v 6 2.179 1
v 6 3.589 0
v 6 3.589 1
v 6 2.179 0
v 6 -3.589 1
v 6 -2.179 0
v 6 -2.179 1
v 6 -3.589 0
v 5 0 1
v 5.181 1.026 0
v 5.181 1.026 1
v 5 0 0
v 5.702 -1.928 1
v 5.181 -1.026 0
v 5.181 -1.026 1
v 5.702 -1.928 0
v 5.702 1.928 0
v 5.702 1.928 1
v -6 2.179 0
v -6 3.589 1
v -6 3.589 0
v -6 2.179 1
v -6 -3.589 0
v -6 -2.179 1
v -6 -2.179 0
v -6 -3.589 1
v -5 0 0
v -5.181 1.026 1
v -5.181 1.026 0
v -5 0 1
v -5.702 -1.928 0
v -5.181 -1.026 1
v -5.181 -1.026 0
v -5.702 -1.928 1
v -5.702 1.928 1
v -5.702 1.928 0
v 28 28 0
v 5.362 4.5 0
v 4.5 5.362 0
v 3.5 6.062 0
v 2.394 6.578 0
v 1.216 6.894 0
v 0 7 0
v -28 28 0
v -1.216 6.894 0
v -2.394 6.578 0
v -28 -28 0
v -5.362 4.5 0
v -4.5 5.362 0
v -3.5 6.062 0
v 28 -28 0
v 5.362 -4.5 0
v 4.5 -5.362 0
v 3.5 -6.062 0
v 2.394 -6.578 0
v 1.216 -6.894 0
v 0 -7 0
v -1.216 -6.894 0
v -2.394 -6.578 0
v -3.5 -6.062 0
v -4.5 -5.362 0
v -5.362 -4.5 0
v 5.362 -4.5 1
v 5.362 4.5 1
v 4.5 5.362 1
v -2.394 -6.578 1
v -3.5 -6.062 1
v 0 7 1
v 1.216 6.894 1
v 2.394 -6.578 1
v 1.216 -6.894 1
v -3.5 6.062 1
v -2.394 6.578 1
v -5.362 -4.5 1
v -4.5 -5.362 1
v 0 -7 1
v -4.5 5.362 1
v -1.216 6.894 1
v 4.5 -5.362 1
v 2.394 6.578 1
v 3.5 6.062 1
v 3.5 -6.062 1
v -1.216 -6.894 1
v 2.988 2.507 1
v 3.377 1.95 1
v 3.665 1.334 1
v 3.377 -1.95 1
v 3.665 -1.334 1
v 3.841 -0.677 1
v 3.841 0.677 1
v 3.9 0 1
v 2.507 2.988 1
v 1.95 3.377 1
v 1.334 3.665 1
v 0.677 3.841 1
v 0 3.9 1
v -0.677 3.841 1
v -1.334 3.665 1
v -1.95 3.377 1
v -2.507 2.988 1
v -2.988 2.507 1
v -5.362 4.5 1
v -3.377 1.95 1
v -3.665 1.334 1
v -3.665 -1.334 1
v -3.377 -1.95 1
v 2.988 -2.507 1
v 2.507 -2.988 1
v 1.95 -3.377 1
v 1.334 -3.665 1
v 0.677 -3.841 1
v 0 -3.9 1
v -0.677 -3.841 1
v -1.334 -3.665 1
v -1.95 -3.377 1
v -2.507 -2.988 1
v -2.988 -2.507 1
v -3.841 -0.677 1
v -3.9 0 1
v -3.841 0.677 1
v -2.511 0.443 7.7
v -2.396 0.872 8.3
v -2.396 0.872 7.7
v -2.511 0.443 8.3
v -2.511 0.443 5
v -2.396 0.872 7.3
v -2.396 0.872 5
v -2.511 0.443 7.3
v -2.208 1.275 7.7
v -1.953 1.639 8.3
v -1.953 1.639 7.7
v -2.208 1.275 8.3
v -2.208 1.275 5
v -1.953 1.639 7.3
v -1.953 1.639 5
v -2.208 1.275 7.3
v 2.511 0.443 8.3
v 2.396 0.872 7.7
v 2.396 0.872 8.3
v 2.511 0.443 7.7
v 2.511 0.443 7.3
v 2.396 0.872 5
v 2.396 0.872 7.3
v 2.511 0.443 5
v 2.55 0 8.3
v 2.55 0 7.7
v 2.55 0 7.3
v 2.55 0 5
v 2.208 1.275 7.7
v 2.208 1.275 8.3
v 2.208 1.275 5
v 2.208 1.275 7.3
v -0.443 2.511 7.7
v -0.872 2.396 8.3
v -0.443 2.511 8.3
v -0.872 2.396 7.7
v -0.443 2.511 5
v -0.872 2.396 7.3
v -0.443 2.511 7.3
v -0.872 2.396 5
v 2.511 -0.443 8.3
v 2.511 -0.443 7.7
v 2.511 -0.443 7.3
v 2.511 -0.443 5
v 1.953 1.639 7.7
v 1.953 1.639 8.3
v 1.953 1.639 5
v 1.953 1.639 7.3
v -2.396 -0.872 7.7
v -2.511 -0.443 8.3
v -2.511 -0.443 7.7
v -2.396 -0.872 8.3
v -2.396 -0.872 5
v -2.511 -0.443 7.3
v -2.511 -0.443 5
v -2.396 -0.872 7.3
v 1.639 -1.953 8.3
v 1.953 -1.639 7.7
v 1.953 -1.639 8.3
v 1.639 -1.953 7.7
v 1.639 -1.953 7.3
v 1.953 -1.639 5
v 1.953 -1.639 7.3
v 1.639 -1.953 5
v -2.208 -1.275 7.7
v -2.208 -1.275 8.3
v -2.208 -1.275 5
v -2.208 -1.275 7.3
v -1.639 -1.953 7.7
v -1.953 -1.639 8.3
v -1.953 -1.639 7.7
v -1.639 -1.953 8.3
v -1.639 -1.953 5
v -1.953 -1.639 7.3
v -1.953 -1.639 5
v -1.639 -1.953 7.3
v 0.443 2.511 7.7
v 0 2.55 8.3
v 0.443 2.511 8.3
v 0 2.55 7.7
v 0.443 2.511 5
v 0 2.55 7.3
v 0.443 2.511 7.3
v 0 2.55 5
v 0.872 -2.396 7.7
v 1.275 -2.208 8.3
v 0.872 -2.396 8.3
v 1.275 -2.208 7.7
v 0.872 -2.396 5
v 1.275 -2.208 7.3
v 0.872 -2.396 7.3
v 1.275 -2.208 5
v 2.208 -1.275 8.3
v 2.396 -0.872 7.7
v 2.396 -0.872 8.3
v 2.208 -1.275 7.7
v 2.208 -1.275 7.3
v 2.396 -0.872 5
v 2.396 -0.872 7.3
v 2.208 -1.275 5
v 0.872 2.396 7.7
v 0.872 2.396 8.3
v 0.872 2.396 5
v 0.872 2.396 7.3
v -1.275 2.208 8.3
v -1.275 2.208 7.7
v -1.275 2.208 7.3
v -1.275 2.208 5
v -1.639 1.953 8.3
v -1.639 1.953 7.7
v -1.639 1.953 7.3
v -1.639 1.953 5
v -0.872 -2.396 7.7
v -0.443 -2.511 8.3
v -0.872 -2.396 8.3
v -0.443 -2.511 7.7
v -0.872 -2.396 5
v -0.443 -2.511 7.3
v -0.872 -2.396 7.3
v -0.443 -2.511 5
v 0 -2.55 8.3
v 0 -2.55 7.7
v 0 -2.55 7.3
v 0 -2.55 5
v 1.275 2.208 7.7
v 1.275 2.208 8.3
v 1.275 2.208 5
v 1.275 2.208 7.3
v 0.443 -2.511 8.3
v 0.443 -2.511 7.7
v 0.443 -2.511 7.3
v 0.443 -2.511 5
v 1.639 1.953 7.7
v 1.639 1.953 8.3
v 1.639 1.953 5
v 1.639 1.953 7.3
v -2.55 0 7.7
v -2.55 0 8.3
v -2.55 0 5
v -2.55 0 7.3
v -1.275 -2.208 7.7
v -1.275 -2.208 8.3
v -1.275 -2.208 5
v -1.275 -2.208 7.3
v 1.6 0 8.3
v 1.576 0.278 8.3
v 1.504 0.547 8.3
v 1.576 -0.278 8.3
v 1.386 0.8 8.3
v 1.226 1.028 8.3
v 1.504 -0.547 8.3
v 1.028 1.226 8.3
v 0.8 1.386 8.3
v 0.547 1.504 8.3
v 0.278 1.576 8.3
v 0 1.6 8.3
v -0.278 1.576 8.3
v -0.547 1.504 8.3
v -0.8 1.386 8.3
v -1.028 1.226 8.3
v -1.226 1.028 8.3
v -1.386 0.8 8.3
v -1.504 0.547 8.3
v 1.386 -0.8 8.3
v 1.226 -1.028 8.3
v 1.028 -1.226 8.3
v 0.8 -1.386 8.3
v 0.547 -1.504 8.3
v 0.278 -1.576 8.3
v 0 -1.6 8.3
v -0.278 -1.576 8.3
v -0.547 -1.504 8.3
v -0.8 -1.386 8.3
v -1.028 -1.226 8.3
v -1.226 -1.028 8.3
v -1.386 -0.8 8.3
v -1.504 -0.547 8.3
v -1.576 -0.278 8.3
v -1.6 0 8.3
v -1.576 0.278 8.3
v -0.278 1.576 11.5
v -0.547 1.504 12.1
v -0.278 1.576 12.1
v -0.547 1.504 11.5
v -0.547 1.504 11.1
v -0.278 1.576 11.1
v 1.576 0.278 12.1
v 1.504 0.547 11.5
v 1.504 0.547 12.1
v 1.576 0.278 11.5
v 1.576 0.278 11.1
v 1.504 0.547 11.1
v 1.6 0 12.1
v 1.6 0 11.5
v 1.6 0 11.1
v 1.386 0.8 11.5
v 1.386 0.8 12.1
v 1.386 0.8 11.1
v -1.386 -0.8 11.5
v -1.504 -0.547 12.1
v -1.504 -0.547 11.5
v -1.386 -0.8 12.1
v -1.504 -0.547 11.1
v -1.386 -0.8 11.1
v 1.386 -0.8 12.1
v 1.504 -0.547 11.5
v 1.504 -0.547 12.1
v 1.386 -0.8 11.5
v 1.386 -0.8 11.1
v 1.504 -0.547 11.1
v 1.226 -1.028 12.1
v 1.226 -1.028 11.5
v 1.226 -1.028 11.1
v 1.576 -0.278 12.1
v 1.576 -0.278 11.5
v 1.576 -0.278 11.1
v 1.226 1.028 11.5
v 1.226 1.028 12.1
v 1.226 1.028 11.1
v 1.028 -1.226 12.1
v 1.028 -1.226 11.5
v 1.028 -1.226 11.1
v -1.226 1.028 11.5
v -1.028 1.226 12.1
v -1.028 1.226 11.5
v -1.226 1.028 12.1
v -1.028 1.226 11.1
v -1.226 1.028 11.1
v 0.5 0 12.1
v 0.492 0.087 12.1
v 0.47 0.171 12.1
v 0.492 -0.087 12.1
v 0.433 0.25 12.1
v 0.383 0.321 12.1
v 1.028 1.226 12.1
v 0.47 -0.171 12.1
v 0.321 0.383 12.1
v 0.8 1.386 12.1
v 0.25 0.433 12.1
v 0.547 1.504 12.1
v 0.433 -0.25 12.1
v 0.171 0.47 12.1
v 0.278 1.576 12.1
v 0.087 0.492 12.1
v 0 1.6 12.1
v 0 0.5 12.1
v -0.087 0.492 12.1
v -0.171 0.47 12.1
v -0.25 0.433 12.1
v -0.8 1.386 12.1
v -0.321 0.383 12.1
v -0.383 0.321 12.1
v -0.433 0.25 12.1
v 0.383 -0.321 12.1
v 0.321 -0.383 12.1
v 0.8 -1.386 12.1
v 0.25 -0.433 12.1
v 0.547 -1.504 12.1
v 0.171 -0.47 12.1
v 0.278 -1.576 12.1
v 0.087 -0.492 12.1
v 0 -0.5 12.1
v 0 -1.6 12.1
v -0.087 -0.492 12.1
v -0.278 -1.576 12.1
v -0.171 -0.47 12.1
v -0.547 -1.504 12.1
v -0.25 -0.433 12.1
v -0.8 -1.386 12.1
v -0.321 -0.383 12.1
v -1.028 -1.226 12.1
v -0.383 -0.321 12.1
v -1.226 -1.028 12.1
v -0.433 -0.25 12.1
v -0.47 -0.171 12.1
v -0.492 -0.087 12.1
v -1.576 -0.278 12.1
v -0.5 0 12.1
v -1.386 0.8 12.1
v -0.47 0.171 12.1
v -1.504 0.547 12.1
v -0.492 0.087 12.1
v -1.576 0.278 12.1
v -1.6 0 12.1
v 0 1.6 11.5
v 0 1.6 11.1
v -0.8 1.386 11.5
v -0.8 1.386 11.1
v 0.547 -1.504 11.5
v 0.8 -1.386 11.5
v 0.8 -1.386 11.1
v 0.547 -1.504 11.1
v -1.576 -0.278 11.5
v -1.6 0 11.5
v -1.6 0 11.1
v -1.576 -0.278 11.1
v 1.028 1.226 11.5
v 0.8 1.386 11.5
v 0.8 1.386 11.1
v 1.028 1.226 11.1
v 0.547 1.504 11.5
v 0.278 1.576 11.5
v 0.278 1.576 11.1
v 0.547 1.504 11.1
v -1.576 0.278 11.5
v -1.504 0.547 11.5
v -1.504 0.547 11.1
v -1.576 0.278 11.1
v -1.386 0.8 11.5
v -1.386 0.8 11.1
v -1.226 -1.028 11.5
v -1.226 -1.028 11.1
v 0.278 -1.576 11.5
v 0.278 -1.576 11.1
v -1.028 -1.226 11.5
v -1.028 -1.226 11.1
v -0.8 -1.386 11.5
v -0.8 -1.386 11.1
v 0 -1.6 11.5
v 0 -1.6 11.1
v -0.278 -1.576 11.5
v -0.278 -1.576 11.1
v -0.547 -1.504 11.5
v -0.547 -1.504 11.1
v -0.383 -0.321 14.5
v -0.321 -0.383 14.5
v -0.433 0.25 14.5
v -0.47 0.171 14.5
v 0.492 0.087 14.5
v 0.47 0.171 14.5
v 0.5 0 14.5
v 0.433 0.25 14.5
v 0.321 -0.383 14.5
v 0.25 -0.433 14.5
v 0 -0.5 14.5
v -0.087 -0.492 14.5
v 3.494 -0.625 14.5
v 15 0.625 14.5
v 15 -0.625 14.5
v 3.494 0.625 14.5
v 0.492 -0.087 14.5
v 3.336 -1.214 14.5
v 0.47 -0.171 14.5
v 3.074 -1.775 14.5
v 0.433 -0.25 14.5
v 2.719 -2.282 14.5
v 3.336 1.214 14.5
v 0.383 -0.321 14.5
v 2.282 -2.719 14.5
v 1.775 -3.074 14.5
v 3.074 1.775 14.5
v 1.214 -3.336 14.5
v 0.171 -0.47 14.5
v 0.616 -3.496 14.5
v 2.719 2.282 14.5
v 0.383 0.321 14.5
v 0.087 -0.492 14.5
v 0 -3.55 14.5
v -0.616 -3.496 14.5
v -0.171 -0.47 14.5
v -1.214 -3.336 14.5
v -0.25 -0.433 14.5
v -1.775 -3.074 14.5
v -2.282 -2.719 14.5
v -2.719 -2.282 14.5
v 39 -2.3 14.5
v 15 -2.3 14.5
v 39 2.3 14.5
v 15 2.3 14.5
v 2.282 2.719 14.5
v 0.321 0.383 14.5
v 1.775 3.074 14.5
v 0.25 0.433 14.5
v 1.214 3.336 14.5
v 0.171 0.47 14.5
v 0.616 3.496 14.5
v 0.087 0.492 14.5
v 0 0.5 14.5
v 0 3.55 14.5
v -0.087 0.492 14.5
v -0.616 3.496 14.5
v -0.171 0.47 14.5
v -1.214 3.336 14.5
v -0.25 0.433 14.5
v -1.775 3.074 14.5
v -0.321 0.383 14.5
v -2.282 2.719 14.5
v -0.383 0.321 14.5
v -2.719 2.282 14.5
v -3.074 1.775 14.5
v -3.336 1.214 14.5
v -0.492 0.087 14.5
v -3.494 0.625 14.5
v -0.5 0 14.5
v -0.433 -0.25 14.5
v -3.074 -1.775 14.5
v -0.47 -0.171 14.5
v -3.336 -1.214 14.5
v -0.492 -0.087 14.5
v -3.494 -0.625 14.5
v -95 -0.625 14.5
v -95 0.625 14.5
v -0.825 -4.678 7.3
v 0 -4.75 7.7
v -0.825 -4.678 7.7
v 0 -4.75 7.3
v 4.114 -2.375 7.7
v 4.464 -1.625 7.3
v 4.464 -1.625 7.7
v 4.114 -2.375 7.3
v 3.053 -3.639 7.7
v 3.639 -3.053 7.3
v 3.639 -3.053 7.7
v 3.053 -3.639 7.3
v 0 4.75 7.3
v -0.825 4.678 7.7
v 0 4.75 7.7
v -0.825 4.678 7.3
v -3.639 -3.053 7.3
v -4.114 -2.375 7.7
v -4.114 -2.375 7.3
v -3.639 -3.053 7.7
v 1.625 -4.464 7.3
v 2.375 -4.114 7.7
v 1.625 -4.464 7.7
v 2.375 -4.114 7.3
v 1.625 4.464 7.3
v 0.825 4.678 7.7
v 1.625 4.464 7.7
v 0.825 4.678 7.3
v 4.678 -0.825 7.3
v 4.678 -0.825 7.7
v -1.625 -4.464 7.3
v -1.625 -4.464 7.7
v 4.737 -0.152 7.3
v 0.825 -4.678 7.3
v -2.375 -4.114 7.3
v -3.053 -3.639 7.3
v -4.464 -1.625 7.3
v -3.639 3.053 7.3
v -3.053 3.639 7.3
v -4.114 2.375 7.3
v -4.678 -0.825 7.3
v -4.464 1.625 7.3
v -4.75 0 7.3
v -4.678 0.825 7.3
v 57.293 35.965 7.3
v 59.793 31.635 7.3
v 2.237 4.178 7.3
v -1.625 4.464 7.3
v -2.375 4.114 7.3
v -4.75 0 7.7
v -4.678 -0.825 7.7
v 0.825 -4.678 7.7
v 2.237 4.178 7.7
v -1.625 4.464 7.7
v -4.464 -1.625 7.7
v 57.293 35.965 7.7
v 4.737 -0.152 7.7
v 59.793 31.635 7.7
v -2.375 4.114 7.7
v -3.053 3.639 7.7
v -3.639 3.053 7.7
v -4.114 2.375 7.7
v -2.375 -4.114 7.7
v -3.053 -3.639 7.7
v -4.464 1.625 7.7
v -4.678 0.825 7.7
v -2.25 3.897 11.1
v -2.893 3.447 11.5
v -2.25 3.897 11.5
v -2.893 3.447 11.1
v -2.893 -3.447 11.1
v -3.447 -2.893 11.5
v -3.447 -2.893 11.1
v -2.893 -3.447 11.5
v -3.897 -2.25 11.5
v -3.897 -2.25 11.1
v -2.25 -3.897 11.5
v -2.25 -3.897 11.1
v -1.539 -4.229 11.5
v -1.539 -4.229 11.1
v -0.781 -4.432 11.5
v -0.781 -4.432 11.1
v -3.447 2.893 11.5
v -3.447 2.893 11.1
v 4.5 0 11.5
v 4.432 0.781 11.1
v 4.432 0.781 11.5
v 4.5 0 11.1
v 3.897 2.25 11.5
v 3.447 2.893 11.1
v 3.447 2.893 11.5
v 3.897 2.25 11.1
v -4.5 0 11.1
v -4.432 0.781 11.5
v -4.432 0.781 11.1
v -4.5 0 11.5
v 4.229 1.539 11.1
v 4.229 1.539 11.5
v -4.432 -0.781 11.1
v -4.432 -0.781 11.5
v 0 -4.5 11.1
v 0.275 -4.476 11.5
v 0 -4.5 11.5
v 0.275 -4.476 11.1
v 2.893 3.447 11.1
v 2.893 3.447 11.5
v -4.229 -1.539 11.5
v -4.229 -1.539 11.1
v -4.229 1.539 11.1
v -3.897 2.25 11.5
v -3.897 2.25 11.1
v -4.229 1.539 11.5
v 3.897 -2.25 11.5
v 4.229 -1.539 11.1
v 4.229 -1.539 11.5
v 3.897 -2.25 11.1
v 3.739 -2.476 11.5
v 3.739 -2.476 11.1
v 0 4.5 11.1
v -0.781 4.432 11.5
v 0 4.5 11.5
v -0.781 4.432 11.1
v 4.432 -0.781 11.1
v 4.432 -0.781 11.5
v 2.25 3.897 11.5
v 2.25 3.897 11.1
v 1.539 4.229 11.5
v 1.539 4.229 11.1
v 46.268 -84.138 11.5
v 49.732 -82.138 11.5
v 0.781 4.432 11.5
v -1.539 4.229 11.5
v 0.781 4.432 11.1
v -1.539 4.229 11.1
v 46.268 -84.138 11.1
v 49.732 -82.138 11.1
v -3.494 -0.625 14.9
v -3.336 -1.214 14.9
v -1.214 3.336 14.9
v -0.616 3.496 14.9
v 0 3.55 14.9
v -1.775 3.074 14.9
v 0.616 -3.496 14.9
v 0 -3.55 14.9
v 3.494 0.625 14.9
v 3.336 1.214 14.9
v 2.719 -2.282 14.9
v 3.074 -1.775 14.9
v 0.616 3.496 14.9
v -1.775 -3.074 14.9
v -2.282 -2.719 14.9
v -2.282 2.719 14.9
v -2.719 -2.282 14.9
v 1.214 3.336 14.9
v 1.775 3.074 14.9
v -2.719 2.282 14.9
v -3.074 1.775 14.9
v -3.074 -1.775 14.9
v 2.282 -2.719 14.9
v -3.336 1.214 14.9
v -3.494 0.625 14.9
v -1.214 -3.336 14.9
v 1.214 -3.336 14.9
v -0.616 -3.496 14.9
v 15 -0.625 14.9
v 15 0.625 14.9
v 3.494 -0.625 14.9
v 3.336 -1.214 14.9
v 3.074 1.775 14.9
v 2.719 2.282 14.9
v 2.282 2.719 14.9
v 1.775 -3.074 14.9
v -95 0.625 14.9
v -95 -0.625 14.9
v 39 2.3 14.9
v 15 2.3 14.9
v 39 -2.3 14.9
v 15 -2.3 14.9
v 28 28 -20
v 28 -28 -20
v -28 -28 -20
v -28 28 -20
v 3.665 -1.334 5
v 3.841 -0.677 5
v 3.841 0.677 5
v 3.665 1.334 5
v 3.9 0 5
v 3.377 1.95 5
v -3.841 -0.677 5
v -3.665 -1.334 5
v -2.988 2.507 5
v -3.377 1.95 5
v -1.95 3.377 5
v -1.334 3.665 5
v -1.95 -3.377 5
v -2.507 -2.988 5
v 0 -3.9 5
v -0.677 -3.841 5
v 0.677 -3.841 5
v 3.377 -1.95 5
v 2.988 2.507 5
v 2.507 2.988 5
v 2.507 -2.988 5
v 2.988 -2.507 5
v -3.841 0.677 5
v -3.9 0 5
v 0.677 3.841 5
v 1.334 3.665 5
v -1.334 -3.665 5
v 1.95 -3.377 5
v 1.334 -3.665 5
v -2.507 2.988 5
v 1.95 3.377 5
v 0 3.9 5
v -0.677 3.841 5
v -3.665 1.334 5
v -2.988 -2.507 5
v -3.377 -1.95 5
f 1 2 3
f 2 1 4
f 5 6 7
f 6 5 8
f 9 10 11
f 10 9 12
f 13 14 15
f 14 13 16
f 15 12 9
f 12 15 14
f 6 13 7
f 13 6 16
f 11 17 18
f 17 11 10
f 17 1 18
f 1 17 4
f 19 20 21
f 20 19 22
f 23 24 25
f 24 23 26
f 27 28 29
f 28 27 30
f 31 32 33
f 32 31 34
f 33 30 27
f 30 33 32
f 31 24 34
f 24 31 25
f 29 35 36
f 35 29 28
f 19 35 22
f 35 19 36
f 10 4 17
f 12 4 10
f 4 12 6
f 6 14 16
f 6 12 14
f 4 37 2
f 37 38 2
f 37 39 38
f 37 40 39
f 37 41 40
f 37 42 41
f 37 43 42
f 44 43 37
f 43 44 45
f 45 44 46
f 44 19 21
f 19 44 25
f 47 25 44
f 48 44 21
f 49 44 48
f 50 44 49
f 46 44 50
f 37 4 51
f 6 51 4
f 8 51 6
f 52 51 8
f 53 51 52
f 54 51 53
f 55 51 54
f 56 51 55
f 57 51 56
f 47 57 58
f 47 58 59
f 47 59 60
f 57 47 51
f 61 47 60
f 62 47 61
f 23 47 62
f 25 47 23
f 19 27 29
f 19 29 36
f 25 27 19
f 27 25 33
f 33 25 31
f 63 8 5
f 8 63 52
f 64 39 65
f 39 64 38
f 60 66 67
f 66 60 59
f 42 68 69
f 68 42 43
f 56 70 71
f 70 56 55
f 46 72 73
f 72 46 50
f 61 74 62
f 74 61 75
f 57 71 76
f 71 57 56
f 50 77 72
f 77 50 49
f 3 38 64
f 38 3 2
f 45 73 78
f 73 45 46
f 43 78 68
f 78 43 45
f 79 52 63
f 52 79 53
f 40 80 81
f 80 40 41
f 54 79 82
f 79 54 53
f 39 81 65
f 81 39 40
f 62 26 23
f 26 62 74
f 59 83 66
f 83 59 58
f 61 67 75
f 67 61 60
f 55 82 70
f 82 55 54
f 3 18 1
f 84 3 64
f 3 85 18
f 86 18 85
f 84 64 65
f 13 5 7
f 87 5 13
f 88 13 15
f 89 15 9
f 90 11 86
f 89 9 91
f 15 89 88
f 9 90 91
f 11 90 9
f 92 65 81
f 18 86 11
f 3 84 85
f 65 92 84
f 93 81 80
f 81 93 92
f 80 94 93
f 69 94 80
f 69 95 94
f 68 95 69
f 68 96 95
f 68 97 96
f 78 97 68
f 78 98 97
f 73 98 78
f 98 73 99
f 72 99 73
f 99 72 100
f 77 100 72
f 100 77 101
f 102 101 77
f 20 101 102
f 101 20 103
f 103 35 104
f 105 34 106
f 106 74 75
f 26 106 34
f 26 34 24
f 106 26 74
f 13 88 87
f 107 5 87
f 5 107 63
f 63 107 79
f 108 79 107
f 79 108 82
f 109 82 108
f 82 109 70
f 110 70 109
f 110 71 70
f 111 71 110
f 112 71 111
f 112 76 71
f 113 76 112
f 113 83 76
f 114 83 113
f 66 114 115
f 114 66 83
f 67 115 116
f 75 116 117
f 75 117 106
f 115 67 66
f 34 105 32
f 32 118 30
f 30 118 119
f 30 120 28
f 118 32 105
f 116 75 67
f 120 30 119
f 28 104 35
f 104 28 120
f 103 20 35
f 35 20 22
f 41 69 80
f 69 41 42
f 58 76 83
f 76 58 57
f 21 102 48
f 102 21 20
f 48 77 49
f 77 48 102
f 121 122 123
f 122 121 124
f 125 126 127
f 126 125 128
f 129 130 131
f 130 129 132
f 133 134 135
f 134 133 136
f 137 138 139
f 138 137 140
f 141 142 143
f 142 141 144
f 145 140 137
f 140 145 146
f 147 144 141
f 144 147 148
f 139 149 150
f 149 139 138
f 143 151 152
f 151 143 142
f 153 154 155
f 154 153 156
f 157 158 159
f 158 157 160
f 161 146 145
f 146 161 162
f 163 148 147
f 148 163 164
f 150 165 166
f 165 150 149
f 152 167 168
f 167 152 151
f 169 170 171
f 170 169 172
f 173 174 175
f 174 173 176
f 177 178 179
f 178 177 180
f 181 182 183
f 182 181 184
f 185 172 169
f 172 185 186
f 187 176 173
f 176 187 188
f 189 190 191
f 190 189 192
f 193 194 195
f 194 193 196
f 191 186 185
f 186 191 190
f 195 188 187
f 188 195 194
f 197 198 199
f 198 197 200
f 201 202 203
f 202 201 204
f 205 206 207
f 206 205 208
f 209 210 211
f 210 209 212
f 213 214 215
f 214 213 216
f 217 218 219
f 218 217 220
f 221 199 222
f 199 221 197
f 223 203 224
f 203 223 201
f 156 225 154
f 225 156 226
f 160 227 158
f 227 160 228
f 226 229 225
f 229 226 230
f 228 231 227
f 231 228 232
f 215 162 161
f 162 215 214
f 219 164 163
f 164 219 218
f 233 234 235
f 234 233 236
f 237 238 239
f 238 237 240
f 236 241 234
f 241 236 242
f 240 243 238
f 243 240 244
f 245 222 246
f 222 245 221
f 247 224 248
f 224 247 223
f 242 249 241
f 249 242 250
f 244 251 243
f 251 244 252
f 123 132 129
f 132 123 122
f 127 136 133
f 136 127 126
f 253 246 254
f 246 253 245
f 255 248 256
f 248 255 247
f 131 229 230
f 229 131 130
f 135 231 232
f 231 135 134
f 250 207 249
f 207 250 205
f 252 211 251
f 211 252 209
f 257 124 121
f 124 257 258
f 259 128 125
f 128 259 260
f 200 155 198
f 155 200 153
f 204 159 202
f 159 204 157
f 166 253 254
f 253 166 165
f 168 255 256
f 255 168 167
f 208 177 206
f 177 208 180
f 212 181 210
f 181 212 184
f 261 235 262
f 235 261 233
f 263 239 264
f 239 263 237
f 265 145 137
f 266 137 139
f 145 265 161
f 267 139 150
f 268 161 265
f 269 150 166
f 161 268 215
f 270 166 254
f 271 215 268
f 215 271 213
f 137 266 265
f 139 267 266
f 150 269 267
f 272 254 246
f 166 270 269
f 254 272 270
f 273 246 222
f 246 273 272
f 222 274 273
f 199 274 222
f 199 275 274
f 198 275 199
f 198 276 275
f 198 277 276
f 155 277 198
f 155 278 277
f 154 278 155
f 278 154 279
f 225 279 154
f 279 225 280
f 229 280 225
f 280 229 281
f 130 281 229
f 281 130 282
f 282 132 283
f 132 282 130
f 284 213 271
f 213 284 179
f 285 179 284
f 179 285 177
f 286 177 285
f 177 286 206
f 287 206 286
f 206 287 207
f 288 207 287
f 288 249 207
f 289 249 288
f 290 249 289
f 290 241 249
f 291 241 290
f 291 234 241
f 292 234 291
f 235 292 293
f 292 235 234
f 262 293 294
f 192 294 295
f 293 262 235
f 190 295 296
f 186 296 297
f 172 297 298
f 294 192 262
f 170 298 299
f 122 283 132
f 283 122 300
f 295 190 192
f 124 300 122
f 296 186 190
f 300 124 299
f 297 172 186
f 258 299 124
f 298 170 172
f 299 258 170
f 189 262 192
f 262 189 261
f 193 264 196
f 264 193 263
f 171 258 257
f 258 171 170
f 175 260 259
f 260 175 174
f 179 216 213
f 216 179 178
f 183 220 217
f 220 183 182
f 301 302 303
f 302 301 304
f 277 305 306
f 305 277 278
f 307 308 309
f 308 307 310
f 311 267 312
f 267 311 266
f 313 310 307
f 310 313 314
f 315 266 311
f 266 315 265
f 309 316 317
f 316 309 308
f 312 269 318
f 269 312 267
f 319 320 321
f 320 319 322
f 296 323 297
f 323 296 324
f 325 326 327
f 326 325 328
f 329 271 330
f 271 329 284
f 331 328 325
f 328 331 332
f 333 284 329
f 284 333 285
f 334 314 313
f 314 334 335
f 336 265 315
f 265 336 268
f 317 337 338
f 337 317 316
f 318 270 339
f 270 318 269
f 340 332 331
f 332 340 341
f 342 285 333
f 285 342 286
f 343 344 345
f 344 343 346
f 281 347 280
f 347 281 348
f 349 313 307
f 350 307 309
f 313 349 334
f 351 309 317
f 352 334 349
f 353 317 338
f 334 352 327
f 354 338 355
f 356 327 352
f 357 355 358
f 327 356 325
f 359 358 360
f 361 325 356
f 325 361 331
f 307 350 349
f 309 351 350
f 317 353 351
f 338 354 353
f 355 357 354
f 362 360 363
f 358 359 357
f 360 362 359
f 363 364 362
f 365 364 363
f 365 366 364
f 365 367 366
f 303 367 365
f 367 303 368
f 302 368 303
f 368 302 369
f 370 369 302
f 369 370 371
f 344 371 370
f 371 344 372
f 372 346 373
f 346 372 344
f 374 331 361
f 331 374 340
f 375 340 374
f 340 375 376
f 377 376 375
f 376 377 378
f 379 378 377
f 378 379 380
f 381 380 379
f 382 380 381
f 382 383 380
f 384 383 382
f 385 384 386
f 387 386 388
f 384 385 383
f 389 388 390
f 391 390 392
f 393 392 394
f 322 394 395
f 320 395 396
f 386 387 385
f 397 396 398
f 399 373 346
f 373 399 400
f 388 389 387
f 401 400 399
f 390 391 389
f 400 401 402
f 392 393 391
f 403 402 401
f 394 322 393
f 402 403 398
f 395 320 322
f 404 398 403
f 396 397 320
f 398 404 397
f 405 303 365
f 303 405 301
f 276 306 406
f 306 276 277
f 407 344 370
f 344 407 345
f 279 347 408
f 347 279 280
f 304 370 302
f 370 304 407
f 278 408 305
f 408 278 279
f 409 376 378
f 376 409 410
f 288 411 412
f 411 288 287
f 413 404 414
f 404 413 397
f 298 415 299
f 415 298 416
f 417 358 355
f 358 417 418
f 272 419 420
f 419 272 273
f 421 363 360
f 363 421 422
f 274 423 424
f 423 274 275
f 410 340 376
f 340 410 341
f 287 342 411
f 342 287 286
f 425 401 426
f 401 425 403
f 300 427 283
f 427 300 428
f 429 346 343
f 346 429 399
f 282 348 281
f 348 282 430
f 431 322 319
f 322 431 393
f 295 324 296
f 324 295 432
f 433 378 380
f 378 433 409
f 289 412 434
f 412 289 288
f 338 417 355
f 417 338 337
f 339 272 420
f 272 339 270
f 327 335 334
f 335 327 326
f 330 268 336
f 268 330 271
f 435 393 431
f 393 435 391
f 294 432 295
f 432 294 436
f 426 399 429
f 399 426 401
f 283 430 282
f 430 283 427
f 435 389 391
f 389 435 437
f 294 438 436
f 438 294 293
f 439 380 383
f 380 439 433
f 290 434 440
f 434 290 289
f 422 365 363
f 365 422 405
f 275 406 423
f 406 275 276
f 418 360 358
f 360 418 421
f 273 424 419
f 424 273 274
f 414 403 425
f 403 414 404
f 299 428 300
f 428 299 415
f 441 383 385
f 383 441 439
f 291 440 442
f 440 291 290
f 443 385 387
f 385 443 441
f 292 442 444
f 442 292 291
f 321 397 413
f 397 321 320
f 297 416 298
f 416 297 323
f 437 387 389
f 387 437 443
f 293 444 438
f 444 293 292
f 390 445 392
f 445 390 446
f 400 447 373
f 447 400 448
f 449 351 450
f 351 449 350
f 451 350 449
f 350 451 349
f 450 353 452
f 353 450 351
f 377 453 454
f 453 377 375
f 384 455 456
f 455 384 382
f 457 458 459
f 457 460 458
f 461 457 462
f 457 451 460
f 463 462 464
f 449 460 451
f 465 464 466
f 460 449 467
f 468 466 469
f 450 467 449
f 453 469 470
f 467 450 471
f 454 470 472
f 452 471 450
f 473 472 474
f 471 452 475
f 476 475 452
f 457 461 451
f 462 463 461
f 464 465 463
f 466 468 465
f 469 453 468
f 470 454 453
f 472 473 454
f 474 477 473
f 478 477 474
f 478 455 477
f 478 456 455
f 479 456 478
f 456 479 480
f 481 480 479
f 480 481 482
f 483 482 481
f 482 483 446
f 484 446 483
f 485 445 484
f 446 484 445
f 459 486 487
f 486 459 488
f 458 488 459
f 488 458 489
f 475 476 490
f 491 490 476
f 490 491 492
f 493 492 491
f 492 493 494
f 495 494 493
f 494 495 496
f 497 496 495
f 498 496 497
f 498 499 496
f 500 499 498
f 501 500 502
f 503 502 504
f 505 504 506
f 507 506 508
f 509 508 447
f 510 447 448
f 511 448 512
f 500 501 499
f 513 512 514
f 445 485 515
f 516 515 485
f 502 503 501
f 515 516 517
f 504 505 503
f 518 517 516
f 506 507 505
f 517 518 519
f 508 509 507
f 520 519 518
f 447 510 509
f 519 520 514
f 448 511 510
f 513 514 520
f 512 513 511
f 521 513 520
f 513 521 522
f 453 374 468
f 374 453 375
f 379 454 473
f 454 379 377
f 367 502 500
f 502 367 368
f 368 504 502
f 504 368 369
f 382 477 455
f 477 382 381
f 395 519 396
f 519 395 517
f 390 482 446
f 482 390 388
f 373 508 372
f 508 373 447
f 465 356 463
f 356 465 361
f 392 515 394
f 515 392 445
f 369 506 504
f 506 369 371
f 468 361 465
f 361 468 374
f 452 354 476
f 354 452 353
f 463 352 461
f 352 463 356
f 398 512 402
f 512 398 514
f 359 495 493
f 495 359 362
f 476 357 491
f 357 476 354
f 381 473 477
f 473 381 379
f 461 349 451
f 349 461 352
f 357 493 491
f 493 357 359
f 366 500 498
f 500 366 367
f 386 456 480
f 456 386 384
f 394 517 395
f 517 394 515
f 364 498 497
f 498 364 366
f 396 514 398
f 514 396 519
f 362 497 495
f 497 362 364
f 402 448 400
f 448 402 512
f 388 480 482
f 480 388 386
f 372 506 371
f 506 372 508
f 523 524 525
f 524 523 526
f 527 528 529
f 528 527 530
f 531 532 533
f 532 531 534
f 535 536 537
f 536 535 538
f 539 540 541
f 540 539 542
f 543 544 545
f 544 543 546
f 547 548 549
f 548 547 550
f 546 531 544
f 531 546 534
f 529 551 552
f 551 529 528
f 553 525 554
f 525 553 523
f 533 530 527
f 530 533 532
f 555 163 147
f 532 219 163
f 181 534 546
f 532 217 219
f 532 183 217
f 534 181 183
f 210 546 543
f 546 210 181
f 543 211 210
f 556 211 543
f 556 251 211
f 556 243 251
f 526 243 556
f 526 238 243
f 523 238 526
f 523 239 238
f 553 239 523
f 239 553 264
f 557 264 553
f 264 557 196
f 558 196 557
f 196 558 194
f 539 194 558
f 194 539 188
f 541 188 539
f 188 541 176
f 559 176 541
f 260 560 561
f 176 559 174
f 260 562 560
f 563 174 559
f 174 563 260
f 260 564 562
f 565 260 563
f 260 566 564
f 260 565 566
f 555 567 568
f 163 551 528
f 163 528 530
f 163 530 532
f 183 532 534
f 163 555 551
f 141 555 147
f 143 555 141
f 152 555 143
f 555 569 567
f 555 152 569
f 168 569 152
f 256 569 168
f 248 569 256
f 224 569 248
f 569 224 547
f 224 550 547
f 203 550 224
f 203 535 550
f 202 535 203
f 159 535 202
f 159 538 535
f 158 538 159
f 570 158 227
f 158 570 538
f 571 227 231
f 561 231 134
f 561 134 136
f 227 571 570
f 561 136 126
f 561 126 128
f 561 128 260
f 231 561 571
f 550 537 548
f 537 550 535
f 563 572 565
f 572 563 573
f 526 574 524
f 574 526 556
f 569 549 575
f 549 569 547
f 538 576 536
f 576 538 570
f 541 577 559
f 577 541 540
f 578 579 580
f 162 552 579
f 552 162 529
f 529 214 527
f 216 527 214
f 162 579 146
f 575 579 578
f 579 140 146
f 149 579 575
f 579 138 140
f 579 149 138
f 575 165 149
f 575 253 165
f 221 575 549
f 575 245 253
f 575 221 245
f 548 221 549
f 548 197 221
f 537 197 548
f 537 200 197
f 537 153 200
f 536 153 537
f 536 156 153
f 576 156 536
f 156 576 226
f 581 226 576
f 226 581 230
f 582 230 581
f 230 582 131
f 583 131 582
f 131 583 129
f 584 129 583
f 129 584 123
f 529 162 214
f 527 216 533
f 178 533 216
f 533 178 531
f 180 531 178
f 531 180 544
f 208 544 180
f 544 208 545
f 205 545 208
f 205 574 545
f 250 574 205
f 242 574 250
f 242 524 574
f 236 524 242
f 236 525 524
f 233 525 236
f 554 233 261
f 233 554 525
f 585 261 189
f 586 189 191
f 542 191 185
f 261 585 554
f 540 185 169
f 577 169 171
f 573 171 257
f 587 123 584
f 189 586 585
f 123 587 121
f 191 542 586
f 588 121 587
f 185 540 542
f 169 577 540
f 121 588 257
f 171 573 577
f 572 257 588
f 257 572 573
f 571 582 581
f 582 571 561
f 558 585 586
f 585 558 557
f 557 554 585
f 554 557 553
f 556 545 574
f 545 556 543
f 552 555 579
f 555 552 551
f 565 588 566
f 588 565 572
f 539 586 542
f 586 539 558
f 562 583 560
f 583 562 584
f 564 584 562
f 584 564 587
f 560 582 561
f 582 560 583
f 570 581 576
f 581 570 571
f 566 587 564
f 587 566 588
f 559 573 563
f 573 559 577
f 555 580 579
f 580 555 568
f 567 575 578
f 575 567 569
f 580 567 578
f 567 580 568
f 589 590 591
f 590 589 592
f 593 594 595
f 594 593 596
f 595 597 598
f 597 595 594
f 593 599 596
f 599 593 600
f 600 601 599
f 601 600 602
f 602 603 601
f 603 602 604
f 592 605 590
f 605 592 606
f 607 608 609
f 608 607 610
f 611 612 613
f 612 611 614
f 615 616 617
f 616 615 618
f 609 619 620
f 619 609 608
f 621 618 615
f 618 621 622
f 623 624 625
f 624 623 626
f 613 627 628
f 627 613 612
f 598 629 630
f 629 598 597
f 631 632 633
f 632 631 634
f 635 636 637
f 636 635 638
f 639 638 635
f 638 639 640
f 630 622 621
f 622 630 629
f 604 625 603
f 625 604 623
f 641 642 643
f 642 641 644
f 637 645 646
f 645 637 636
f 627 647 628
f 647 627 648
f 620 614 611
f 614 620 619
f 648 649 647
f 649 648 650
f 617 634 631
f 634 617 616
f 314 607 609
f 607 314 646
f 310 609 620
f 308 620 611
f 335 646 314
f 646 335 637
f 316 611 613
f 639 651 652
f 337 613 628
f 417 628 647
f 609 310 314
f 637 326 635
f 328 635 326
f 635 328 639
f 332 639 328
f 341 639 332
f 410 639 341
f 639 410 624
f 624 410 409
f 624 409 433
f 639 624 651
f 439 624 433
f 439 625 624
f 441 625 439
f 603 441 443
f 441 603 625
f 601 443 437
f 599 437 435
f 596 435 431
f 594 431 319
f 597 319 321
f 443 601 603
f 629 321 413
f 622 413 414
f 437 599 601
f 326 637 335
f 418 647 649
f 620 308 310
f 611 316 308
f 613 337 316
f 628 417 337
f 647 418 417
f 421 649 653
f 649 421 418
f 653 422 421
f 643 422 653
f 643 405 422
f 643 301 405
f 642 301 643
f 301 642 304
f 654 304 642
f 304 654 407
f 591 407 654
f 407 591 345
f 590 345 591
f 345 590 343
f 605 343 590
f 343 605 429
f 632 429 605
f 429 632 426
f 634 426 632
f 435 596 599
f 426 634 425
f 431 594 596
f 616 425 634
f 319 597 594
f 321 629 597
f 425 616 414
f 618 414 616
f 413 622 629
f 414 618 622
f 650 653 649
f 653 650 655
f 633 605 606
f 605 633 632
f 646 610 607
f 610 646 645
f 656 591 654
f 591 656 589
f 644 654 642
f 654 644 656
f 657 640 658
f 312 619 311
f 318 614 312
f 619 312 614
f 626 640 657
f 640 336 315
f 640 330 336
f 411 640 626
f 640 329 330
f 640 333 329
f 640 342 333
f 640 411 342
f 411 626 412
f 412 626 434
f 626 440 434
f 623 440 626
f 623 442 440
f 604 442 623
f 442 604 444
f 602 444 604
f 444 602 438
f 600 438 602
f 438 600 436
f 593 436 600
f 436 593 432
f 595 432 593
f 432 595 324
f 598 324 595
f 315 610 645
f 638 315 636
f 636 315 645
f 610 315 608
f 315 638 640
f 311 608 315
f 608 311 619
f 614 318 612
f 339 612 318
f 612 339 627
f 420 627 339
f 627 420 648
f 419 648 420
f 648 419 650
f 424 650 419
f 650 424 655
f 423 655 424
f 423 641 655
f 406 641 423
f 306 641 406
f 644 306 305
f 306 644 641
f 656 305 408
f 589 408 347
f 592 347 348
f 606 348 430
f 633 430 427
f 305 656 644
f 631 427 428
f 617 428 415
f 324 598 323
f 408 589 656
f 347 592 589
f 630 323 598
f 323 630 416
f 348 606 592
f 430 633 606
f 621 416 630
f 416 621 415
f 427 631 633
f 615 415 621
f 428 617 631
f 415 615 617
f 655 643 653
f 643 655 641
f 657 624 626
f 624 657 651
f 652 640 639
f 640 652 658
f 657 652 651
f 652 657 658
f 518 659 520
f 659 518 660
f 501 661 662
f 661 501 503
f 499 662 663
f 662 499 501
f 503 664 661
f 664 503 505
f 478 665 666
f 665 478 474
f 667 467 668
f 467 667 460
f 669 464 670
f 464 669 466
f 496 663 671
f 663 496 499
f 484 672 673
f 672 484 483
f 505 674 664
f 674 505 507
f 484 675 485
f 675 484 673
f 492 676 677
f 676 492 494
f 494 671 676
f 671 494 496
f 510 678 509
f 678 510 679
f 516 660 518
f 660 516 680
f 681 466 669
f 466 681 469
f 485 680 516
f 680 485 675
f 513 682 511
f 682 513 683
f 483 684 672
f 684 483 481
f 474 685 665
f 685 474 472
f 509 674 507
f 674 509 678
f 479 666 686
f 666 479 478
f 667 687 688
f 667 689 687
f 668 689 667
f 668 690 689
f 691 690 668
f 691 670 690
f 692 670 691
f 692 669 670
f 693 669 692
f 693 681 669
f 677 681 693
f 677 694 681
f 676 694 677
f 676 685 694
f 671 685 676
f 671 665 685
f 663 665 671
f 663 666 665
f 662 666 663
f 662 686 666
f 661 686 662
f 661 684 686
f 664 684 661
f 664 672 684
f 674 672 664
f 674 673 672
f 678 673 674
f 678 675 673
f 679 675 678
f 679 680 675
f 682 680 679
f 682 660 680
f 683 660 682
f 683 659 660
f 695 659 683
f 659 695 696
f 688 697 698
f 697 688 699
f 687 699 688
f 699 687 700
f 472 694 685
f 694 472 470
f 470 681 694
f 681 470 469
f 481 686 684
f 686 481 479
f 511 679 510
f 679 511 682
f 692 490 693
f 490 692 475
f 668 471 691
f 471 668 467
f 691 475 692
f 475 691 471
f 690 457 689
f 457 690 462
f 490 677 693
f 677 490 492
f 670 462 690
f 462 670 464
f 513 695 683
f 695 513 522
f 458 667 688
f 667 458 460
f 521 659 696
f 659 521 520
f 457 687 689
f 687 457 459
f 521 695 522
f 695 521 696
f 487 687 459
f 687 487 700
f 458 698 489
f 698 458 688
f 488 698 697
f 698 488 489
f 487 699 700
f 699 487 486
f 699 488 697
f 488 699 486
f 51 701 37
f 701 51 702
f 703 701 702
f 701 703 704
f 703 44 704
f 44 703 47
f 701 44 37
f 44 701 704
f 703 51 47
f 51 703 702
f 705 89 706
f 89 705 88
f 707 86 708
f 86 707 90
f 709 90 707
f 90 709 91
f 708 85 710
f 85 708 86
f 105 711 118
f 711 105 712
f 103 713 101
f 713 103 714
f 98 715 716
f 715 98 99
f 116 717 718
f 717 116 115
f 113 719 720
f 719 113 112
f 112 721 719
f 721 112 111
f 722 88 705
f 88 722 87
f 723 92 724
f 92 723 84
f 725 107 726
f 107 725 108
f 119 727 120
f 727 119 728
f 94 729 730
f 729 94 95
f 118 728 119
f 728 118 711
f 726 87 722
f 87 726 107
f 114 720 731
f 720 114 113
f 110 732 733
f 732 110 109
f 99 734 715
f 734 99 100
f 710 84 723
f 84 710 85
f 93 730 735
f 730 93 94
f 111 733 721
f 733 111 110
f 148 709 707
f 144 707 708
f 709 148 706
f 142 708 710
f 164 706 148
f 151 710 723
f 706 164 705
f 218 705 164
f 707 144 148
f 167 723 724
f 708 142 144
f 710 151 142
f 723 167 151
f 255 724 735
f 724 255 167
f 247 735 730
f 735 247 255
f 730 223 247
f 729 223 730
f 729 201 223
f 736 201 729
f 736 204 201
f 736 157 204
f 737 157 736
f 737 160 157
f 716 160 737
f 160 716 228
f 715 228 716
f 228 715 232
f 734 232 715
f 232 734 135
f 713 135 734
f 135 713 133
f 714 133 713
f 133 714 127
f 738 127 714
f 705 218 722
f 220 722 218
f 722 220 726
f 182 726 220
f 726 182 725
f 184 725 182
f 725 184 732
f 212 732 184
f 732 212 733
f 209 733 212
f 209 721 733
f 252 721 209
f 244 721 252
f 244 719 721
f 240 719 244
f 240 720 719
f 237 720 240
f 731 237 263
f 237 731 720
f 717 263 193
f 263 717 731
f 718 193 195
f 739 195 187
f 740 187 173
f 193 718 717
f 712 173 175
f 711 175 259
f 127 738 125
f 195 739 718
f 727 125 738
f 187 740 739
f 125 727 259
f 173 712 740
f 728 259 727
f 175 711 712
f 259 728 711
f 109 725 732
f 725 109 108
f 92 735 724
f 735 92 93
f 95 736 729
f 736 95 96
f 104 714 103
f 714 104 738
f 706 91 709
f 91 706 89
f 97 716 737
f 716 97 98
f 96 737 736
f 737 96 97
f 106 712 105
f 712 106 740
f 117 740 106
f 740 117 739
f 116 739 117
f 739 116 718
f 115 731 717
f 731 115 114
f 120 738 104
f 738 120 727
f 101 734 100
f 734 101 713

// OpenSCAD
module clock_movement( time = [2, 25, 45], hand_style = "modern") {
    
    // box-shaped main body
    width = 56;
    depth = 56;
    height = 20;
    
    // alignment pattern
    alignment_dm = 14; // diameter of alignment pattern
    alignment_h = 1;    // height of alignment pattern
    alignment_flat = 1; // recess of falttening
    alignment_notch_dm = 6; // diameter of alignment notches
    alignment_notch_fl = 2; // recess of notch flattening
    
    // main body
    color("Gray")
    // method 1 as of in the book
    translate( [-width / 2, -depth / 2 , -height ] )
    cube( [width, depth, height] ); 
    // method 2
//    translate( [0, 0, -height/2] )
//   # cube( [width, depth, height], center = true ); 

    // screw terminal (measured from main body)
    screw_terminal_dm = 7.8;    // screw terminal diameter
    screw_terminal_h = 5;   // screw terminal height
    
    // clock hands axle
    hour_axle_dm = 5.1; // hour axle diameter
    hour_axle_h = 8.3;  // hour axle height
    
    minute_axle_dm = 3.2; // hour axle diameter
    minute_axle_h = 12.1;  // hour axle height
    
    second_axle_dm = 1; // hour axle diameter
    second_axle_h = 14.5;  // hour axle height
    
    // alignment pattern
     difference() {
        
        color("DarkBlue")
        cylinder( d = alignment_dm, h = alignment_h, $fn = 36);
        
        color("Gray")
        for ( i = [0:1] )
        mirror( [i, 0, 0] )
        union() {
            translate([ alignment_dm / 2 - alignment_flat, -(alignment_dm + 2) / 2, -1 ])
            cube([alignment_flat + 1, alignment_dm + 2, alignment_h + 2 ]);
            
            translate([ alignment_dm / 2 - alignment_notch_fl + alignment_notch_dm / 2, 0, -1 ])
            cylinder( d = alignment_notch_dm, h = alignment_h +2, $fn = 18);
        }
    }
    
    // screw terminal
    color("Gold")
    cylinder( d = screw_terminal_dm, h = screw_terminal_h, $fn = 36);
    
    // axles
    color("Black") {
        cylinder( d = hour_axle_dm, h = hour_axle_h, $fn = 36);
        cylinder( d = minute_axle_dm, h = minute_axle_h, $fn = 36);
        cylinder( d = second_axle_dm, h = second_axle_h, $fn = 36);
    }
    
    // clock hands
    rotate( [0, 0, -360 *  time[0] / 12] )
    translate( [0, 0, hour_axle_h - 1] )
    hour_hand();
    
    rotate( [0, 0, -360 * time[1] / 60] )
    translate( [0, 0, minute_axle_h - 1] )
    minute_hand();
    
    rotate( [0, 0, -360 * time[2] / 60] )
    translate( [0, 0, second_axle_h ] )
    second_hand();
    
    module hour_hand()  // German: stundenzeiger
    {
        
        h = 0.4;   // height
        l = 72.35; // length
        r = 67.6;  // radius
        b = 5;     // width
        dm = 9.5;  // diameter
        
        if (hand_style == "modern") {
            color("Black")
            union() {
                cylinder( d = dm, h = h, $fn = 36);
                
                translate( [ -b / 2,  0, 0 ] )
                    cube ( [ b, r, h] );
                }
            }
        }
    
    module minute_hand()    // German: minute hand
        {
        
        h  = 0.4;   // height
        l  = 100.5; // length
        r  = 96;    // radius
        b  = 4;     // width
        dm = 9;     // diameter
        
        if (hand_style == "modern") {
            color("Black")
            union() {
                cylinder( d = dm, h = h, $fn = 36 );
                
                translate( [-b / 2, 0, 0] )
                cube( [b, r, h] );
            }
        }
    }
    
    module second_hand()    // German: sekundenzeiger
    {
        
        b1  = 1.25; // width front part
        l1  = 95;   // length front part
        b2  = 1.25; // width neck
        l2  = 15;   // length neck
        b3  = 4.6;  // width back part
        l3  = 24;   // length back part
        dm  = 7.1;  // diameter
        h   = 0.4;  // material thickness
        
        if (hand_style == "modern") {
            color("Red")
            union() {
                cylinder( d = dm, h = h, $fn = 36);
                
                translate( [-b1 / 2, 0, 0] )
                cube( [b1, l1, h] );
                
                translate( [-b2 / 2, -l2, 0] )
                cube( [b2, l2, h] );

                translate( [-b3 / 2, -(l2 + l3), 0] )
                cube( [b3, l3, h] );
            }
        }
       
        }
    
    }
    
clock_movement();
